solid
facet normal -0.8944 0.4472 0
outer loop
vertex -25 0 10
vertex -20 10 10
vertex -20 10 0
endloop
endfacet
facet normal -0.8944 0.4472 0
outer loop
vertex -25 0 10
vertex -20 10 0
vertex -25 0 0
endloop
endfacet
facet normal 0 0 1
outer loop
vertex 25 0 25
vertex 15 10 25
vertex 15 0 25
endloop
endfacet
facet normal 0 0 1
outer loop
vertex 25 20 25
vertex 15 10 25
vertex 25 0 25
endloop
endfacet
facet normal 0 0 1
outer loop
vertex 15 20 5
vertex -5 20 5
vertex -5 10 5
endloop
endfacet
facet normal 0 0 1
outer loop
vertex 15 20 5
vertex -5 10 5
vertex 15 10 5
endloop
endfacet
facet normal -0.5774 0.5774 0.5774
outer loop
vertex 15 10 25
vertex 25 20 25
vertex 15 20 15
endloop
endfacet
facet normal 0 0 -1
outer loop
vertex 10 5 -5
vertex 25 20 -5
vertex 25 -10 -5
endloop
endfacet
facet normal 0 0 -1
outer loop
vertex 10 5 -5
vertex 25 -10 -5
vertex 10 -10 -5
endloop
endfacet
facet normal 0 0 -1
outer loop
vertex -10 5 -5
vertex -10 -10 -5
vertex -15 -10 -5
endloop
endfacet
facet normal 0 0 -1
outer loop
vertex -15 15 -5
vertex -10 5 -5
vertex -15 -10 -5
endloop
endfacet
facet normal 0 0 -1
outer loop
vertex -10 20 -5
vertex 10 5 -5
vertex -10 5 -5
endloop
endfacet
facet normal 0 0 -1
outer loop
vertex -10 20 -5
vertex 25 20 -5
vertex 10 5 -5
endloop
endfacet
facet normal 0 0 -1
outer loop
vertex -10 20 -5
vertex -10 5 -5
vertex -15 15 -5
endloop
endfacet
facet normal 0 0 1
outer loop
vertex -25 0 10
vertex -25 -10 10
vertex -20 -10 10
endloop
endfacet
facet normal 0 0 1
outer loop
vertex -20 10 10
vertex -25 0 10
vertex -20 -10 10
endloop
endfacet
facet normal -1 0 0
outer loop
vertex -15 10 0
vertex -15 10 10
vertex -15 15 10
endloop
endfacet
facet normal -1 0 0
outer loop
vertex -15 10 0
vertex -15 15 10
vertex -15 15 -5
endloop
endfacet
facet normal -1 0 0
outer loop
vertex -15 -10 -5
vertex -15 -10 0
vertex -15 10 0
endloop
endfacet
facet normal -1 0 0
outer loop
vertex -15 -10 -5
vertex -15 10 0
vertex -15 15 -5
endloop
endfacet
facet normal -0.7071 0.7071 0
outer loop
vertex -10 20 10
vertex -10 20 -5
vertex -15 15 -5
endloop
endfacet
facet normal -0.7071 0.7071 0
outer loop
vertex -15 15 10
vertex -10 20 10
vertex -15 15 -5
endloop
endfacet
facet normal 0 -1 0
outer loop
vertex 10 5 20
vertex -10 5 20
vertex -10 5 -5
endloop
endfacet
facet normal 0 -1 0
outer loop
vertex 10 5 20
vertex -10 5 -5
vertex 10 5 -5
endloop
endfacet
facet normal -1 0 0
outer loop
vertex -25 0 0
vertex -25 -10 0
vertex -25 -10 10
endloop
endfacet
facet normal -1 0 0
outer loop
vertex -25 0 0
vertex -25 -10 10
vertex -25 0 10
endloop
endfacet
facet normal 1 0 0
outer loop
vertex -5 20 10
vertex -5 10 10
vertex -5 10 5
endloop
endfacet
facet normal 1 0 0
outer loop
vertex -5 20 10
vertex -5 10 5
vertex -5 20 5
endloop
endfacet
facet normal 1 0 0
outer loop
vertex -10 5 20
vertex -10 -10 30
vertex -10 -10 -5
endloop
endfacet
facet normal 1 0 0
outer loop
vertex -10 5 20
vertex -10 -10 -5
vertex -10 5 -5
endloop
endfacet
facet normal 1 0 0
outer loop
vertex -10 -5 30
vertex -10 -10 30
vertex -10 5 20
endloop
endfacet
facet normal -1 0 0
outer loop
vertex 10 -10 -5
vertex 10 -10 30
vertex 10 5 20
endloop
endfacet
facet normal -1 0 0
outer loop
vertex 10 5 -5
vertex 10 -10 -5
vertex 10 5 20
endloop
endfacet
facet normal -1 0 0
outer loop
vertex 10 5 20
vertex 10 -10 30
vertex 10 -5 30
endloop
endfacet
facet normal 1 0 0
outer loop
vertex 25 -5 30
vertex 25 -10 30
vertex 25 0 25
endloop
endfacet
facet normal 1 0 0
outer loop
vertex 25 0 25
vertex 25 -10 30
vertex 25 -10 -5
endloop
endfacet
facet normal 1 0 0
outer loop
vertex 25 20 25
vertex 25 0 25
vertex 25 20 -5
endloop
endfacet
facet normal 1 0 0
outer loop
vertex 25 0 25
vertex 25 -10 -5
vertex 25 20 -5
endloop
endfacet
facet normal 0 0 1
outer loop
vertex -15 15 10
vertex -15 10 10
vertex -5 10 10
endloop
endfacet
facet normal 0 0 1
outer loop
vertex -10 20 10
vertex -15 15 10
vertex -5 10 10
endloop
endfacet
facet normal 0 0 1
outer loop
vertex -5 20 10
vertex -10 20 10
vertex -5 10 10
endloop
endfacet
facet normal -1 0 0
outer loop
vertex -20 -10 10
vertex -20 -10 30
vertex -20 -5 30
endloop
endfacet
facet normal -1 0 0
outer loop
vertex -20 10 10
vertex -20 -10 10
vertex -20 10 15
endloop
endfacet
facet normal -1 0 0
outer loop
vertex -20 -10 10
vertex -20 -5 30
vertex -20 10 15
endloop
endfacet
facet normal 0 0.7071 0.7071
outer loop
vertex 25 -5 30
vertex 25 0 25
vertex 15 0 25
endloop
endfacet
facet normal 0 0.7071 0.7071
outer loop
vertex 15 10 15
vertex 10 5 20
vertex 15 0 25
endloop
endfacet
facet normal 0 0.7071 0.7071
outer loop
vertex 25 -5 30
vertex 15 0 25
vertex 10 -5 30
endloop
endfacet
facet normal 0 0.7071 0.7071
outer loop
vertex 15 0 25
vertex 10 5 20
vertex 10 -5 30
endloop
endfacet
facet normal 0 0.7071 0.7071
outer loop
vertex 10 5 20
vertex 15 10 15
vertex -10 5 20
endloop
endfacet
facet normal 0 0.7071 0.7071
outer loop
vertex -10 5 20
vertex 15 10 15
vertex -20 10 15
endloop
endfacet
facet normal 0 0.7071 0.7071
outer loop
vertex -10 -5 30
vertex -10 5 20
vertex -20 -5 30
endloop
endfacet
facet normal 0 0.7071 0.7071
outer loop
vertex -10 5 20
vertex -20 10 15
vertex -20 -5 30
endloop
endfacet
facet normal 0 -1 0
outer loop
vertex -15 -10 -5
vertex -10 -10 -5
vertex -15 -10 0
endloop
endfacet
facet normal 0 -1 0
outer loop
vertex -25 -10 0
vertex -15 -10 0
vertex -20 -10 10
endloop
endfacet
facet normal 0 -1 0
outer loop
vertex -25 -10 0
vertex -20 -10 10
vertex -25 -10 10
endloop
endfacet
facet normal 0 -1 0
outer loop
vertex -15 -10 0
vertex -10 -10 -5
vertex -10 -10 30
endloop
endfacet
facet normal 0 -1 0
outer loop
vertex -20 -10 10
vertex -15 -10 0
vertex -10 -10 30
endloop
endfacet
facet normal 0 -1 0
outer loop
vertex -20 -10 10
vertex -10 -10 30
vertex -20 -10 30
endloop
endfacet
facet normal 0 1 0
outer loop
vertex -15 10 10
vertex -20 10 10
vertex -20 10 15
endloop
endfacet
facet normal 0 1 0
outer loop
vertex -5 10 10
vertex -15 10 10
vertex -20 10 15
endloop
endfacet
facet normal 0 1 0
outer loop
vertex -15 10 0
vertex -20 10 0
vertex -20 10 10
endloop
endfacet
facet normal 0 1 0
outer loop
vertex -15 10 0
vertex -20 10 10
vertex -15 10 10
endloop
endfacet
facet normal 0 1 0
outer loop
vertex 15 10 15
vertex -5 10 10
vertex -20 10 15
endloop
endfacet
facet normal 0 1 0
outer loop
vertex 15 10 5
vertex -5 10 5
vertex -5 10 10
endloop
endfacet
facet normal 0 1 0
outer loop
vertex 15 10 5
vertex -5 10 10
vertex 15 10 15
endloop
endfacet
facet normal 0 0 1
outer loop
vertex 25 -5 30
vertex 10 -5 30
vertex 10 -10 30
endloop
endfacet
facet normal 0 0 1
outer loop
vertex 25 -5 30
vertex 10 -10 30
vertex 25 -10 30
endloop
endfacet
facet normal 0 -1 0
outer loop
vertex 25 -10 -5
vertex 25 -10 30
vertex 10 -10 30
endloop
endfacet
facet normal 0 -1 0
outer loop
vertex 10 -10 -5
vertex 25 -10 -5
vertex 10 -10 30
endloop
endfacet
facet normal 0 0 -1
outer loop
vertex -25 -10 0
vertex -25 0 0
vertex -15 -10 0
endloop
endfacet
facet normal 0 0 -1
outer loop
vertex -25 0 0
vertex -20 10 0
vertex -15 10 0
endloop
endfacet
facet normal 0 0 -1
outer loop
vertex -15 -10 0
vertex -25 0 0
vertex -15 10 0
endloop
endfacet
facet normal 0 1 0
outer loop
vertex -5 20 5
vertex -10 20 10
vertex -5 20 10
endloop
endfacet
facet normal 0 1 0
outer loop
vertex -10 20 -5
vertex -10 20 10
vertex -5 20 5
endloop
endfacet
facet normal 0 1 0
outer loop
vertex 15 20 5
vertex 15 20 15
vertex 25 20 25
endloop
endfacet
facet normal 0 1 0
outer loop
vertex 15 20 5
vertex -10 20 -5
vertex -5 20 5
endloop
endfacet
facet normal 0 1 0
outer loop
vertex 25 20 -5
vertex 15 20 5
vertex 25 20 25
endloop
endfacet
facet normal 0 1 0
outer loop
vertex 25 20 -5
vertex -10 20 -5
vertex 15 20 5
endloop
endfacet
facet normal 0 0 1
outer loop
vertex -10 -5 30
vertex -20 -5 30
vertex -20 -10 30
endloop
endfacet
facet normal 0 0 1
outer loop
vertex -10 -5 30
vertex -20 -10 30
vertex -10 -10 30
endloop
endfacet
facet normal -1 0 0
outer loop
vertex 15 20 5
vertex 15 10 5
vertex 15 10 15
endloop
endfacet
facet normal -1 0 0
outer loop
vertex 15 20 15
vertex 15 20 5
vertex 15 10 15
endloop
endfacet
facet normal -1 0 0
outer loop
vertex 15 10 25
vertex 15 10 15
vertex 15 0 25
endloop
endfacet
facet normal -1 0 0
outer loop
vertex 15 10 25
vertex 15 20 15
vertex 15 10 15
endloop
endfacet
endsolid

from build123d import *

# Parameters (mm, degrees)
SKETCH1_W           = 50
SKETCH1_H           = 20
BOSS_EXTRUDE1_DEPTH = 30
SKETCH2_W           = 20
SKETCH2_H           = 15
CUT_EXTRUDE1_DEPTH  = 31
SKETCH3_W           = 5
SKETCH3_H           = 20
CUT_EXTRUDE2_DEPTH  = 20
CUT_EXTRUDE3_DEPTH  = 11
CUT_EXTRUDE4_DEPTH  = 46
SKETCH7_W           = 40
SKETCH7_H           = 30
BOSS_EXTRUDE2_DEPTH = 5
SKETCH8_W           = 20
SKETCH8_H           = 15
CUT_EXTRUDE5_DEPTH  = 6
SKETCH9_W           = 40
SKETCH9_H           = 10
BOSS_EXTRUDE3_DEPTH = 10
SKETCH10_W          = 20
SKETCH10_H          = 10
CUT_EXTRUDE6_DEPTH  = 5
CUT_EXTRUDE7_DEPTH  = 16
SKETCH12_W          = 10
SKETCH12_H          = 10
BOSS_EXTRUDE4_DEPTH = 5
SKETCH13_W          = 10
SKETCH13_H          = 10
BOSS_EXTRUDE5_DEPTH = 10
SKETCH14_W          = 10
SKETCH14_H          = 10
BOSS_EXTRUDE6_DEPTH = 10
CUT_EXTRUDE8_DEPTH  = 10


with BuildPart() as part:
    # Sketch1 → Boss-Extrude1 (new body)
    with BuildSketch(Plane.XY):
        Rectangle(SKETCH1_W, SKETCH1_H)
    extrude(amount=BOSS_EXTRUDE1_DEPTH)

    # Sketch2 → Cut-Extrude1 (cut, through all)
    with BuildSketch(Plane.XY.offset(30)):
        with Locations((0, -2.5)):
            Rectangle(SKETCH2_W, SKETCH2_H)
    extrude(amount=-CUT_EXTRUDE1_DEPTH, mode=Mode.SUBTRACT)

    # Sketch3 → Cut-Extrude2 (cut)
    with BuildSketch(Plane.XY.offset(30)):
        with Locations((-22.5, 0)):
            Rectangle(SKETCH3_W, SKETCH3_H)
    extrude(amount=-CUT_EXTRUDE2_DEPTH, mode=Mode.SUBTRACT)

    # Sketch4 → Cut-Extrude3 (cut, through all)
    with BuildSketch(Plane.XY.offset(10)):
        Polygon((-20, 10), (-25, 0), (-25, 10), align=None)
    extrude(amount=-CUT_EXTRUDE3_DEPTH, mode=Mode.SUBTRACT)

    # Sketch5 → Cut-Extrude4 (cut, through all)
    with BuildSketch(Plane.ZY.offset(20)):
        Polygon((15, 10), (30, -5), (30, 10), align=None)
    extrude(amount=-CUT_EXTRUDE4_DEPTH, mode=Mode.SUBTRACT)

    # Sketch7 → Boss-Extrude2 (add)
    with BuildSketch(Plane(origin=(0, 0, 0), x_dir=(-1, 0, 0), z_dir=(0, 0, -1))):
        with Locations((-5, 5)):
            Rectangle(SKETCH7_W, SKETCH7_H)
    extrude(amount=BOSS_EXTRUDE2_DEPTH)

    # Sketch8 → Cut-Extrude5 (cut, through all)
    with BuildSketch(Plane.XY):
        with Locations((0, -2.5)):
            Rectangle(SKETCH8_W, SKETCH8_H)
    extrude(amount=-CUT_EXTRUDE5_DEPTH, mode=Mode.SUBTRACT)

    # Sketch9 → Boss-Extrude3 (add)
    with BuildSketch(Plane(origin=(0, 10, 0), x_dir=(1, 0, 0), z_dir=(0, 1, 0))):
        with Locations((5, -5)):
            Rectangle(SKETCH9_W, SKETCH9_H)
    extrude(amount=BOSS_EXTRUDE3_DEPTH)

    # Sketch10 → Cut-Extrude6 (cut)
    with BuildSketch(Plane.XY.offset(10)):
        with Locations((5, 15)):
            Rectangle(SKETCH10_W, SKETCH10_H)
    extrude(amount=-CUT_EXTRUDE6_DEPTH, mode=Mode.SUBTRACT)

    # Sketch11 → Cut-Extrude7 (cut, through all)
    with BuildSketch(Plane.XY.offset(10)):
        Polygon((-15, 20), (-10, 20), (-15, 15), align=None)
    extrude(amount=-CUT_EXTRUDE7_DEPTH, mode=Mode.SUBTRACT)

    # Sketch12 → Boss-Extrude4 (add)
    with BuildSketch(Plane.XY.offset(10)):
        with Locations((20, 15)):
            Rectangle(SKETCH12_W, SKETCH12_H)
    extrude(amount=BOSS_EXTRUDE4_DEPTH)

    # Sketch13 → Boss-Extrude5 (add)
    with BuildSketch(Plane.XY.offset(15)):
        with Locations((20, 15)):
            Rectangle(SKETCH13_W, SKETCH13_H)
    extrude(amount=BOSS_EXTRUDE5_DEPTH)

    # Sketch14 → Boss-Extrude6 (add)
    with BuildSketch(Plane.XZ.offset(-10)):
        with Locations((20, 20)):
            Rectangle(SKETCH14_W, SKETCH14_H)
    extrude(amount=BOSS_EXTRUDE6_DEPTH)

    # Sketch17 → Cut-Extrude8 (cut)
    with BuildSketch(Plane(origin=(-6.666666667, 6.666666667, 6.666666667), x_dir=(0.816496581, 0.40824829, 0.40824829), z_dir=(-0.577350269, 0.577350269, 0.577350269))):
        Polygon((26.53613888, 3.535533906), (38.783587594, -3.535533906), (26.53613888, -10.606601718), align=None)
    extrude(amount=CUT_EXTRUDE8_DEPTH, mode=Mode.SUBTRACT)


solid = part.part
